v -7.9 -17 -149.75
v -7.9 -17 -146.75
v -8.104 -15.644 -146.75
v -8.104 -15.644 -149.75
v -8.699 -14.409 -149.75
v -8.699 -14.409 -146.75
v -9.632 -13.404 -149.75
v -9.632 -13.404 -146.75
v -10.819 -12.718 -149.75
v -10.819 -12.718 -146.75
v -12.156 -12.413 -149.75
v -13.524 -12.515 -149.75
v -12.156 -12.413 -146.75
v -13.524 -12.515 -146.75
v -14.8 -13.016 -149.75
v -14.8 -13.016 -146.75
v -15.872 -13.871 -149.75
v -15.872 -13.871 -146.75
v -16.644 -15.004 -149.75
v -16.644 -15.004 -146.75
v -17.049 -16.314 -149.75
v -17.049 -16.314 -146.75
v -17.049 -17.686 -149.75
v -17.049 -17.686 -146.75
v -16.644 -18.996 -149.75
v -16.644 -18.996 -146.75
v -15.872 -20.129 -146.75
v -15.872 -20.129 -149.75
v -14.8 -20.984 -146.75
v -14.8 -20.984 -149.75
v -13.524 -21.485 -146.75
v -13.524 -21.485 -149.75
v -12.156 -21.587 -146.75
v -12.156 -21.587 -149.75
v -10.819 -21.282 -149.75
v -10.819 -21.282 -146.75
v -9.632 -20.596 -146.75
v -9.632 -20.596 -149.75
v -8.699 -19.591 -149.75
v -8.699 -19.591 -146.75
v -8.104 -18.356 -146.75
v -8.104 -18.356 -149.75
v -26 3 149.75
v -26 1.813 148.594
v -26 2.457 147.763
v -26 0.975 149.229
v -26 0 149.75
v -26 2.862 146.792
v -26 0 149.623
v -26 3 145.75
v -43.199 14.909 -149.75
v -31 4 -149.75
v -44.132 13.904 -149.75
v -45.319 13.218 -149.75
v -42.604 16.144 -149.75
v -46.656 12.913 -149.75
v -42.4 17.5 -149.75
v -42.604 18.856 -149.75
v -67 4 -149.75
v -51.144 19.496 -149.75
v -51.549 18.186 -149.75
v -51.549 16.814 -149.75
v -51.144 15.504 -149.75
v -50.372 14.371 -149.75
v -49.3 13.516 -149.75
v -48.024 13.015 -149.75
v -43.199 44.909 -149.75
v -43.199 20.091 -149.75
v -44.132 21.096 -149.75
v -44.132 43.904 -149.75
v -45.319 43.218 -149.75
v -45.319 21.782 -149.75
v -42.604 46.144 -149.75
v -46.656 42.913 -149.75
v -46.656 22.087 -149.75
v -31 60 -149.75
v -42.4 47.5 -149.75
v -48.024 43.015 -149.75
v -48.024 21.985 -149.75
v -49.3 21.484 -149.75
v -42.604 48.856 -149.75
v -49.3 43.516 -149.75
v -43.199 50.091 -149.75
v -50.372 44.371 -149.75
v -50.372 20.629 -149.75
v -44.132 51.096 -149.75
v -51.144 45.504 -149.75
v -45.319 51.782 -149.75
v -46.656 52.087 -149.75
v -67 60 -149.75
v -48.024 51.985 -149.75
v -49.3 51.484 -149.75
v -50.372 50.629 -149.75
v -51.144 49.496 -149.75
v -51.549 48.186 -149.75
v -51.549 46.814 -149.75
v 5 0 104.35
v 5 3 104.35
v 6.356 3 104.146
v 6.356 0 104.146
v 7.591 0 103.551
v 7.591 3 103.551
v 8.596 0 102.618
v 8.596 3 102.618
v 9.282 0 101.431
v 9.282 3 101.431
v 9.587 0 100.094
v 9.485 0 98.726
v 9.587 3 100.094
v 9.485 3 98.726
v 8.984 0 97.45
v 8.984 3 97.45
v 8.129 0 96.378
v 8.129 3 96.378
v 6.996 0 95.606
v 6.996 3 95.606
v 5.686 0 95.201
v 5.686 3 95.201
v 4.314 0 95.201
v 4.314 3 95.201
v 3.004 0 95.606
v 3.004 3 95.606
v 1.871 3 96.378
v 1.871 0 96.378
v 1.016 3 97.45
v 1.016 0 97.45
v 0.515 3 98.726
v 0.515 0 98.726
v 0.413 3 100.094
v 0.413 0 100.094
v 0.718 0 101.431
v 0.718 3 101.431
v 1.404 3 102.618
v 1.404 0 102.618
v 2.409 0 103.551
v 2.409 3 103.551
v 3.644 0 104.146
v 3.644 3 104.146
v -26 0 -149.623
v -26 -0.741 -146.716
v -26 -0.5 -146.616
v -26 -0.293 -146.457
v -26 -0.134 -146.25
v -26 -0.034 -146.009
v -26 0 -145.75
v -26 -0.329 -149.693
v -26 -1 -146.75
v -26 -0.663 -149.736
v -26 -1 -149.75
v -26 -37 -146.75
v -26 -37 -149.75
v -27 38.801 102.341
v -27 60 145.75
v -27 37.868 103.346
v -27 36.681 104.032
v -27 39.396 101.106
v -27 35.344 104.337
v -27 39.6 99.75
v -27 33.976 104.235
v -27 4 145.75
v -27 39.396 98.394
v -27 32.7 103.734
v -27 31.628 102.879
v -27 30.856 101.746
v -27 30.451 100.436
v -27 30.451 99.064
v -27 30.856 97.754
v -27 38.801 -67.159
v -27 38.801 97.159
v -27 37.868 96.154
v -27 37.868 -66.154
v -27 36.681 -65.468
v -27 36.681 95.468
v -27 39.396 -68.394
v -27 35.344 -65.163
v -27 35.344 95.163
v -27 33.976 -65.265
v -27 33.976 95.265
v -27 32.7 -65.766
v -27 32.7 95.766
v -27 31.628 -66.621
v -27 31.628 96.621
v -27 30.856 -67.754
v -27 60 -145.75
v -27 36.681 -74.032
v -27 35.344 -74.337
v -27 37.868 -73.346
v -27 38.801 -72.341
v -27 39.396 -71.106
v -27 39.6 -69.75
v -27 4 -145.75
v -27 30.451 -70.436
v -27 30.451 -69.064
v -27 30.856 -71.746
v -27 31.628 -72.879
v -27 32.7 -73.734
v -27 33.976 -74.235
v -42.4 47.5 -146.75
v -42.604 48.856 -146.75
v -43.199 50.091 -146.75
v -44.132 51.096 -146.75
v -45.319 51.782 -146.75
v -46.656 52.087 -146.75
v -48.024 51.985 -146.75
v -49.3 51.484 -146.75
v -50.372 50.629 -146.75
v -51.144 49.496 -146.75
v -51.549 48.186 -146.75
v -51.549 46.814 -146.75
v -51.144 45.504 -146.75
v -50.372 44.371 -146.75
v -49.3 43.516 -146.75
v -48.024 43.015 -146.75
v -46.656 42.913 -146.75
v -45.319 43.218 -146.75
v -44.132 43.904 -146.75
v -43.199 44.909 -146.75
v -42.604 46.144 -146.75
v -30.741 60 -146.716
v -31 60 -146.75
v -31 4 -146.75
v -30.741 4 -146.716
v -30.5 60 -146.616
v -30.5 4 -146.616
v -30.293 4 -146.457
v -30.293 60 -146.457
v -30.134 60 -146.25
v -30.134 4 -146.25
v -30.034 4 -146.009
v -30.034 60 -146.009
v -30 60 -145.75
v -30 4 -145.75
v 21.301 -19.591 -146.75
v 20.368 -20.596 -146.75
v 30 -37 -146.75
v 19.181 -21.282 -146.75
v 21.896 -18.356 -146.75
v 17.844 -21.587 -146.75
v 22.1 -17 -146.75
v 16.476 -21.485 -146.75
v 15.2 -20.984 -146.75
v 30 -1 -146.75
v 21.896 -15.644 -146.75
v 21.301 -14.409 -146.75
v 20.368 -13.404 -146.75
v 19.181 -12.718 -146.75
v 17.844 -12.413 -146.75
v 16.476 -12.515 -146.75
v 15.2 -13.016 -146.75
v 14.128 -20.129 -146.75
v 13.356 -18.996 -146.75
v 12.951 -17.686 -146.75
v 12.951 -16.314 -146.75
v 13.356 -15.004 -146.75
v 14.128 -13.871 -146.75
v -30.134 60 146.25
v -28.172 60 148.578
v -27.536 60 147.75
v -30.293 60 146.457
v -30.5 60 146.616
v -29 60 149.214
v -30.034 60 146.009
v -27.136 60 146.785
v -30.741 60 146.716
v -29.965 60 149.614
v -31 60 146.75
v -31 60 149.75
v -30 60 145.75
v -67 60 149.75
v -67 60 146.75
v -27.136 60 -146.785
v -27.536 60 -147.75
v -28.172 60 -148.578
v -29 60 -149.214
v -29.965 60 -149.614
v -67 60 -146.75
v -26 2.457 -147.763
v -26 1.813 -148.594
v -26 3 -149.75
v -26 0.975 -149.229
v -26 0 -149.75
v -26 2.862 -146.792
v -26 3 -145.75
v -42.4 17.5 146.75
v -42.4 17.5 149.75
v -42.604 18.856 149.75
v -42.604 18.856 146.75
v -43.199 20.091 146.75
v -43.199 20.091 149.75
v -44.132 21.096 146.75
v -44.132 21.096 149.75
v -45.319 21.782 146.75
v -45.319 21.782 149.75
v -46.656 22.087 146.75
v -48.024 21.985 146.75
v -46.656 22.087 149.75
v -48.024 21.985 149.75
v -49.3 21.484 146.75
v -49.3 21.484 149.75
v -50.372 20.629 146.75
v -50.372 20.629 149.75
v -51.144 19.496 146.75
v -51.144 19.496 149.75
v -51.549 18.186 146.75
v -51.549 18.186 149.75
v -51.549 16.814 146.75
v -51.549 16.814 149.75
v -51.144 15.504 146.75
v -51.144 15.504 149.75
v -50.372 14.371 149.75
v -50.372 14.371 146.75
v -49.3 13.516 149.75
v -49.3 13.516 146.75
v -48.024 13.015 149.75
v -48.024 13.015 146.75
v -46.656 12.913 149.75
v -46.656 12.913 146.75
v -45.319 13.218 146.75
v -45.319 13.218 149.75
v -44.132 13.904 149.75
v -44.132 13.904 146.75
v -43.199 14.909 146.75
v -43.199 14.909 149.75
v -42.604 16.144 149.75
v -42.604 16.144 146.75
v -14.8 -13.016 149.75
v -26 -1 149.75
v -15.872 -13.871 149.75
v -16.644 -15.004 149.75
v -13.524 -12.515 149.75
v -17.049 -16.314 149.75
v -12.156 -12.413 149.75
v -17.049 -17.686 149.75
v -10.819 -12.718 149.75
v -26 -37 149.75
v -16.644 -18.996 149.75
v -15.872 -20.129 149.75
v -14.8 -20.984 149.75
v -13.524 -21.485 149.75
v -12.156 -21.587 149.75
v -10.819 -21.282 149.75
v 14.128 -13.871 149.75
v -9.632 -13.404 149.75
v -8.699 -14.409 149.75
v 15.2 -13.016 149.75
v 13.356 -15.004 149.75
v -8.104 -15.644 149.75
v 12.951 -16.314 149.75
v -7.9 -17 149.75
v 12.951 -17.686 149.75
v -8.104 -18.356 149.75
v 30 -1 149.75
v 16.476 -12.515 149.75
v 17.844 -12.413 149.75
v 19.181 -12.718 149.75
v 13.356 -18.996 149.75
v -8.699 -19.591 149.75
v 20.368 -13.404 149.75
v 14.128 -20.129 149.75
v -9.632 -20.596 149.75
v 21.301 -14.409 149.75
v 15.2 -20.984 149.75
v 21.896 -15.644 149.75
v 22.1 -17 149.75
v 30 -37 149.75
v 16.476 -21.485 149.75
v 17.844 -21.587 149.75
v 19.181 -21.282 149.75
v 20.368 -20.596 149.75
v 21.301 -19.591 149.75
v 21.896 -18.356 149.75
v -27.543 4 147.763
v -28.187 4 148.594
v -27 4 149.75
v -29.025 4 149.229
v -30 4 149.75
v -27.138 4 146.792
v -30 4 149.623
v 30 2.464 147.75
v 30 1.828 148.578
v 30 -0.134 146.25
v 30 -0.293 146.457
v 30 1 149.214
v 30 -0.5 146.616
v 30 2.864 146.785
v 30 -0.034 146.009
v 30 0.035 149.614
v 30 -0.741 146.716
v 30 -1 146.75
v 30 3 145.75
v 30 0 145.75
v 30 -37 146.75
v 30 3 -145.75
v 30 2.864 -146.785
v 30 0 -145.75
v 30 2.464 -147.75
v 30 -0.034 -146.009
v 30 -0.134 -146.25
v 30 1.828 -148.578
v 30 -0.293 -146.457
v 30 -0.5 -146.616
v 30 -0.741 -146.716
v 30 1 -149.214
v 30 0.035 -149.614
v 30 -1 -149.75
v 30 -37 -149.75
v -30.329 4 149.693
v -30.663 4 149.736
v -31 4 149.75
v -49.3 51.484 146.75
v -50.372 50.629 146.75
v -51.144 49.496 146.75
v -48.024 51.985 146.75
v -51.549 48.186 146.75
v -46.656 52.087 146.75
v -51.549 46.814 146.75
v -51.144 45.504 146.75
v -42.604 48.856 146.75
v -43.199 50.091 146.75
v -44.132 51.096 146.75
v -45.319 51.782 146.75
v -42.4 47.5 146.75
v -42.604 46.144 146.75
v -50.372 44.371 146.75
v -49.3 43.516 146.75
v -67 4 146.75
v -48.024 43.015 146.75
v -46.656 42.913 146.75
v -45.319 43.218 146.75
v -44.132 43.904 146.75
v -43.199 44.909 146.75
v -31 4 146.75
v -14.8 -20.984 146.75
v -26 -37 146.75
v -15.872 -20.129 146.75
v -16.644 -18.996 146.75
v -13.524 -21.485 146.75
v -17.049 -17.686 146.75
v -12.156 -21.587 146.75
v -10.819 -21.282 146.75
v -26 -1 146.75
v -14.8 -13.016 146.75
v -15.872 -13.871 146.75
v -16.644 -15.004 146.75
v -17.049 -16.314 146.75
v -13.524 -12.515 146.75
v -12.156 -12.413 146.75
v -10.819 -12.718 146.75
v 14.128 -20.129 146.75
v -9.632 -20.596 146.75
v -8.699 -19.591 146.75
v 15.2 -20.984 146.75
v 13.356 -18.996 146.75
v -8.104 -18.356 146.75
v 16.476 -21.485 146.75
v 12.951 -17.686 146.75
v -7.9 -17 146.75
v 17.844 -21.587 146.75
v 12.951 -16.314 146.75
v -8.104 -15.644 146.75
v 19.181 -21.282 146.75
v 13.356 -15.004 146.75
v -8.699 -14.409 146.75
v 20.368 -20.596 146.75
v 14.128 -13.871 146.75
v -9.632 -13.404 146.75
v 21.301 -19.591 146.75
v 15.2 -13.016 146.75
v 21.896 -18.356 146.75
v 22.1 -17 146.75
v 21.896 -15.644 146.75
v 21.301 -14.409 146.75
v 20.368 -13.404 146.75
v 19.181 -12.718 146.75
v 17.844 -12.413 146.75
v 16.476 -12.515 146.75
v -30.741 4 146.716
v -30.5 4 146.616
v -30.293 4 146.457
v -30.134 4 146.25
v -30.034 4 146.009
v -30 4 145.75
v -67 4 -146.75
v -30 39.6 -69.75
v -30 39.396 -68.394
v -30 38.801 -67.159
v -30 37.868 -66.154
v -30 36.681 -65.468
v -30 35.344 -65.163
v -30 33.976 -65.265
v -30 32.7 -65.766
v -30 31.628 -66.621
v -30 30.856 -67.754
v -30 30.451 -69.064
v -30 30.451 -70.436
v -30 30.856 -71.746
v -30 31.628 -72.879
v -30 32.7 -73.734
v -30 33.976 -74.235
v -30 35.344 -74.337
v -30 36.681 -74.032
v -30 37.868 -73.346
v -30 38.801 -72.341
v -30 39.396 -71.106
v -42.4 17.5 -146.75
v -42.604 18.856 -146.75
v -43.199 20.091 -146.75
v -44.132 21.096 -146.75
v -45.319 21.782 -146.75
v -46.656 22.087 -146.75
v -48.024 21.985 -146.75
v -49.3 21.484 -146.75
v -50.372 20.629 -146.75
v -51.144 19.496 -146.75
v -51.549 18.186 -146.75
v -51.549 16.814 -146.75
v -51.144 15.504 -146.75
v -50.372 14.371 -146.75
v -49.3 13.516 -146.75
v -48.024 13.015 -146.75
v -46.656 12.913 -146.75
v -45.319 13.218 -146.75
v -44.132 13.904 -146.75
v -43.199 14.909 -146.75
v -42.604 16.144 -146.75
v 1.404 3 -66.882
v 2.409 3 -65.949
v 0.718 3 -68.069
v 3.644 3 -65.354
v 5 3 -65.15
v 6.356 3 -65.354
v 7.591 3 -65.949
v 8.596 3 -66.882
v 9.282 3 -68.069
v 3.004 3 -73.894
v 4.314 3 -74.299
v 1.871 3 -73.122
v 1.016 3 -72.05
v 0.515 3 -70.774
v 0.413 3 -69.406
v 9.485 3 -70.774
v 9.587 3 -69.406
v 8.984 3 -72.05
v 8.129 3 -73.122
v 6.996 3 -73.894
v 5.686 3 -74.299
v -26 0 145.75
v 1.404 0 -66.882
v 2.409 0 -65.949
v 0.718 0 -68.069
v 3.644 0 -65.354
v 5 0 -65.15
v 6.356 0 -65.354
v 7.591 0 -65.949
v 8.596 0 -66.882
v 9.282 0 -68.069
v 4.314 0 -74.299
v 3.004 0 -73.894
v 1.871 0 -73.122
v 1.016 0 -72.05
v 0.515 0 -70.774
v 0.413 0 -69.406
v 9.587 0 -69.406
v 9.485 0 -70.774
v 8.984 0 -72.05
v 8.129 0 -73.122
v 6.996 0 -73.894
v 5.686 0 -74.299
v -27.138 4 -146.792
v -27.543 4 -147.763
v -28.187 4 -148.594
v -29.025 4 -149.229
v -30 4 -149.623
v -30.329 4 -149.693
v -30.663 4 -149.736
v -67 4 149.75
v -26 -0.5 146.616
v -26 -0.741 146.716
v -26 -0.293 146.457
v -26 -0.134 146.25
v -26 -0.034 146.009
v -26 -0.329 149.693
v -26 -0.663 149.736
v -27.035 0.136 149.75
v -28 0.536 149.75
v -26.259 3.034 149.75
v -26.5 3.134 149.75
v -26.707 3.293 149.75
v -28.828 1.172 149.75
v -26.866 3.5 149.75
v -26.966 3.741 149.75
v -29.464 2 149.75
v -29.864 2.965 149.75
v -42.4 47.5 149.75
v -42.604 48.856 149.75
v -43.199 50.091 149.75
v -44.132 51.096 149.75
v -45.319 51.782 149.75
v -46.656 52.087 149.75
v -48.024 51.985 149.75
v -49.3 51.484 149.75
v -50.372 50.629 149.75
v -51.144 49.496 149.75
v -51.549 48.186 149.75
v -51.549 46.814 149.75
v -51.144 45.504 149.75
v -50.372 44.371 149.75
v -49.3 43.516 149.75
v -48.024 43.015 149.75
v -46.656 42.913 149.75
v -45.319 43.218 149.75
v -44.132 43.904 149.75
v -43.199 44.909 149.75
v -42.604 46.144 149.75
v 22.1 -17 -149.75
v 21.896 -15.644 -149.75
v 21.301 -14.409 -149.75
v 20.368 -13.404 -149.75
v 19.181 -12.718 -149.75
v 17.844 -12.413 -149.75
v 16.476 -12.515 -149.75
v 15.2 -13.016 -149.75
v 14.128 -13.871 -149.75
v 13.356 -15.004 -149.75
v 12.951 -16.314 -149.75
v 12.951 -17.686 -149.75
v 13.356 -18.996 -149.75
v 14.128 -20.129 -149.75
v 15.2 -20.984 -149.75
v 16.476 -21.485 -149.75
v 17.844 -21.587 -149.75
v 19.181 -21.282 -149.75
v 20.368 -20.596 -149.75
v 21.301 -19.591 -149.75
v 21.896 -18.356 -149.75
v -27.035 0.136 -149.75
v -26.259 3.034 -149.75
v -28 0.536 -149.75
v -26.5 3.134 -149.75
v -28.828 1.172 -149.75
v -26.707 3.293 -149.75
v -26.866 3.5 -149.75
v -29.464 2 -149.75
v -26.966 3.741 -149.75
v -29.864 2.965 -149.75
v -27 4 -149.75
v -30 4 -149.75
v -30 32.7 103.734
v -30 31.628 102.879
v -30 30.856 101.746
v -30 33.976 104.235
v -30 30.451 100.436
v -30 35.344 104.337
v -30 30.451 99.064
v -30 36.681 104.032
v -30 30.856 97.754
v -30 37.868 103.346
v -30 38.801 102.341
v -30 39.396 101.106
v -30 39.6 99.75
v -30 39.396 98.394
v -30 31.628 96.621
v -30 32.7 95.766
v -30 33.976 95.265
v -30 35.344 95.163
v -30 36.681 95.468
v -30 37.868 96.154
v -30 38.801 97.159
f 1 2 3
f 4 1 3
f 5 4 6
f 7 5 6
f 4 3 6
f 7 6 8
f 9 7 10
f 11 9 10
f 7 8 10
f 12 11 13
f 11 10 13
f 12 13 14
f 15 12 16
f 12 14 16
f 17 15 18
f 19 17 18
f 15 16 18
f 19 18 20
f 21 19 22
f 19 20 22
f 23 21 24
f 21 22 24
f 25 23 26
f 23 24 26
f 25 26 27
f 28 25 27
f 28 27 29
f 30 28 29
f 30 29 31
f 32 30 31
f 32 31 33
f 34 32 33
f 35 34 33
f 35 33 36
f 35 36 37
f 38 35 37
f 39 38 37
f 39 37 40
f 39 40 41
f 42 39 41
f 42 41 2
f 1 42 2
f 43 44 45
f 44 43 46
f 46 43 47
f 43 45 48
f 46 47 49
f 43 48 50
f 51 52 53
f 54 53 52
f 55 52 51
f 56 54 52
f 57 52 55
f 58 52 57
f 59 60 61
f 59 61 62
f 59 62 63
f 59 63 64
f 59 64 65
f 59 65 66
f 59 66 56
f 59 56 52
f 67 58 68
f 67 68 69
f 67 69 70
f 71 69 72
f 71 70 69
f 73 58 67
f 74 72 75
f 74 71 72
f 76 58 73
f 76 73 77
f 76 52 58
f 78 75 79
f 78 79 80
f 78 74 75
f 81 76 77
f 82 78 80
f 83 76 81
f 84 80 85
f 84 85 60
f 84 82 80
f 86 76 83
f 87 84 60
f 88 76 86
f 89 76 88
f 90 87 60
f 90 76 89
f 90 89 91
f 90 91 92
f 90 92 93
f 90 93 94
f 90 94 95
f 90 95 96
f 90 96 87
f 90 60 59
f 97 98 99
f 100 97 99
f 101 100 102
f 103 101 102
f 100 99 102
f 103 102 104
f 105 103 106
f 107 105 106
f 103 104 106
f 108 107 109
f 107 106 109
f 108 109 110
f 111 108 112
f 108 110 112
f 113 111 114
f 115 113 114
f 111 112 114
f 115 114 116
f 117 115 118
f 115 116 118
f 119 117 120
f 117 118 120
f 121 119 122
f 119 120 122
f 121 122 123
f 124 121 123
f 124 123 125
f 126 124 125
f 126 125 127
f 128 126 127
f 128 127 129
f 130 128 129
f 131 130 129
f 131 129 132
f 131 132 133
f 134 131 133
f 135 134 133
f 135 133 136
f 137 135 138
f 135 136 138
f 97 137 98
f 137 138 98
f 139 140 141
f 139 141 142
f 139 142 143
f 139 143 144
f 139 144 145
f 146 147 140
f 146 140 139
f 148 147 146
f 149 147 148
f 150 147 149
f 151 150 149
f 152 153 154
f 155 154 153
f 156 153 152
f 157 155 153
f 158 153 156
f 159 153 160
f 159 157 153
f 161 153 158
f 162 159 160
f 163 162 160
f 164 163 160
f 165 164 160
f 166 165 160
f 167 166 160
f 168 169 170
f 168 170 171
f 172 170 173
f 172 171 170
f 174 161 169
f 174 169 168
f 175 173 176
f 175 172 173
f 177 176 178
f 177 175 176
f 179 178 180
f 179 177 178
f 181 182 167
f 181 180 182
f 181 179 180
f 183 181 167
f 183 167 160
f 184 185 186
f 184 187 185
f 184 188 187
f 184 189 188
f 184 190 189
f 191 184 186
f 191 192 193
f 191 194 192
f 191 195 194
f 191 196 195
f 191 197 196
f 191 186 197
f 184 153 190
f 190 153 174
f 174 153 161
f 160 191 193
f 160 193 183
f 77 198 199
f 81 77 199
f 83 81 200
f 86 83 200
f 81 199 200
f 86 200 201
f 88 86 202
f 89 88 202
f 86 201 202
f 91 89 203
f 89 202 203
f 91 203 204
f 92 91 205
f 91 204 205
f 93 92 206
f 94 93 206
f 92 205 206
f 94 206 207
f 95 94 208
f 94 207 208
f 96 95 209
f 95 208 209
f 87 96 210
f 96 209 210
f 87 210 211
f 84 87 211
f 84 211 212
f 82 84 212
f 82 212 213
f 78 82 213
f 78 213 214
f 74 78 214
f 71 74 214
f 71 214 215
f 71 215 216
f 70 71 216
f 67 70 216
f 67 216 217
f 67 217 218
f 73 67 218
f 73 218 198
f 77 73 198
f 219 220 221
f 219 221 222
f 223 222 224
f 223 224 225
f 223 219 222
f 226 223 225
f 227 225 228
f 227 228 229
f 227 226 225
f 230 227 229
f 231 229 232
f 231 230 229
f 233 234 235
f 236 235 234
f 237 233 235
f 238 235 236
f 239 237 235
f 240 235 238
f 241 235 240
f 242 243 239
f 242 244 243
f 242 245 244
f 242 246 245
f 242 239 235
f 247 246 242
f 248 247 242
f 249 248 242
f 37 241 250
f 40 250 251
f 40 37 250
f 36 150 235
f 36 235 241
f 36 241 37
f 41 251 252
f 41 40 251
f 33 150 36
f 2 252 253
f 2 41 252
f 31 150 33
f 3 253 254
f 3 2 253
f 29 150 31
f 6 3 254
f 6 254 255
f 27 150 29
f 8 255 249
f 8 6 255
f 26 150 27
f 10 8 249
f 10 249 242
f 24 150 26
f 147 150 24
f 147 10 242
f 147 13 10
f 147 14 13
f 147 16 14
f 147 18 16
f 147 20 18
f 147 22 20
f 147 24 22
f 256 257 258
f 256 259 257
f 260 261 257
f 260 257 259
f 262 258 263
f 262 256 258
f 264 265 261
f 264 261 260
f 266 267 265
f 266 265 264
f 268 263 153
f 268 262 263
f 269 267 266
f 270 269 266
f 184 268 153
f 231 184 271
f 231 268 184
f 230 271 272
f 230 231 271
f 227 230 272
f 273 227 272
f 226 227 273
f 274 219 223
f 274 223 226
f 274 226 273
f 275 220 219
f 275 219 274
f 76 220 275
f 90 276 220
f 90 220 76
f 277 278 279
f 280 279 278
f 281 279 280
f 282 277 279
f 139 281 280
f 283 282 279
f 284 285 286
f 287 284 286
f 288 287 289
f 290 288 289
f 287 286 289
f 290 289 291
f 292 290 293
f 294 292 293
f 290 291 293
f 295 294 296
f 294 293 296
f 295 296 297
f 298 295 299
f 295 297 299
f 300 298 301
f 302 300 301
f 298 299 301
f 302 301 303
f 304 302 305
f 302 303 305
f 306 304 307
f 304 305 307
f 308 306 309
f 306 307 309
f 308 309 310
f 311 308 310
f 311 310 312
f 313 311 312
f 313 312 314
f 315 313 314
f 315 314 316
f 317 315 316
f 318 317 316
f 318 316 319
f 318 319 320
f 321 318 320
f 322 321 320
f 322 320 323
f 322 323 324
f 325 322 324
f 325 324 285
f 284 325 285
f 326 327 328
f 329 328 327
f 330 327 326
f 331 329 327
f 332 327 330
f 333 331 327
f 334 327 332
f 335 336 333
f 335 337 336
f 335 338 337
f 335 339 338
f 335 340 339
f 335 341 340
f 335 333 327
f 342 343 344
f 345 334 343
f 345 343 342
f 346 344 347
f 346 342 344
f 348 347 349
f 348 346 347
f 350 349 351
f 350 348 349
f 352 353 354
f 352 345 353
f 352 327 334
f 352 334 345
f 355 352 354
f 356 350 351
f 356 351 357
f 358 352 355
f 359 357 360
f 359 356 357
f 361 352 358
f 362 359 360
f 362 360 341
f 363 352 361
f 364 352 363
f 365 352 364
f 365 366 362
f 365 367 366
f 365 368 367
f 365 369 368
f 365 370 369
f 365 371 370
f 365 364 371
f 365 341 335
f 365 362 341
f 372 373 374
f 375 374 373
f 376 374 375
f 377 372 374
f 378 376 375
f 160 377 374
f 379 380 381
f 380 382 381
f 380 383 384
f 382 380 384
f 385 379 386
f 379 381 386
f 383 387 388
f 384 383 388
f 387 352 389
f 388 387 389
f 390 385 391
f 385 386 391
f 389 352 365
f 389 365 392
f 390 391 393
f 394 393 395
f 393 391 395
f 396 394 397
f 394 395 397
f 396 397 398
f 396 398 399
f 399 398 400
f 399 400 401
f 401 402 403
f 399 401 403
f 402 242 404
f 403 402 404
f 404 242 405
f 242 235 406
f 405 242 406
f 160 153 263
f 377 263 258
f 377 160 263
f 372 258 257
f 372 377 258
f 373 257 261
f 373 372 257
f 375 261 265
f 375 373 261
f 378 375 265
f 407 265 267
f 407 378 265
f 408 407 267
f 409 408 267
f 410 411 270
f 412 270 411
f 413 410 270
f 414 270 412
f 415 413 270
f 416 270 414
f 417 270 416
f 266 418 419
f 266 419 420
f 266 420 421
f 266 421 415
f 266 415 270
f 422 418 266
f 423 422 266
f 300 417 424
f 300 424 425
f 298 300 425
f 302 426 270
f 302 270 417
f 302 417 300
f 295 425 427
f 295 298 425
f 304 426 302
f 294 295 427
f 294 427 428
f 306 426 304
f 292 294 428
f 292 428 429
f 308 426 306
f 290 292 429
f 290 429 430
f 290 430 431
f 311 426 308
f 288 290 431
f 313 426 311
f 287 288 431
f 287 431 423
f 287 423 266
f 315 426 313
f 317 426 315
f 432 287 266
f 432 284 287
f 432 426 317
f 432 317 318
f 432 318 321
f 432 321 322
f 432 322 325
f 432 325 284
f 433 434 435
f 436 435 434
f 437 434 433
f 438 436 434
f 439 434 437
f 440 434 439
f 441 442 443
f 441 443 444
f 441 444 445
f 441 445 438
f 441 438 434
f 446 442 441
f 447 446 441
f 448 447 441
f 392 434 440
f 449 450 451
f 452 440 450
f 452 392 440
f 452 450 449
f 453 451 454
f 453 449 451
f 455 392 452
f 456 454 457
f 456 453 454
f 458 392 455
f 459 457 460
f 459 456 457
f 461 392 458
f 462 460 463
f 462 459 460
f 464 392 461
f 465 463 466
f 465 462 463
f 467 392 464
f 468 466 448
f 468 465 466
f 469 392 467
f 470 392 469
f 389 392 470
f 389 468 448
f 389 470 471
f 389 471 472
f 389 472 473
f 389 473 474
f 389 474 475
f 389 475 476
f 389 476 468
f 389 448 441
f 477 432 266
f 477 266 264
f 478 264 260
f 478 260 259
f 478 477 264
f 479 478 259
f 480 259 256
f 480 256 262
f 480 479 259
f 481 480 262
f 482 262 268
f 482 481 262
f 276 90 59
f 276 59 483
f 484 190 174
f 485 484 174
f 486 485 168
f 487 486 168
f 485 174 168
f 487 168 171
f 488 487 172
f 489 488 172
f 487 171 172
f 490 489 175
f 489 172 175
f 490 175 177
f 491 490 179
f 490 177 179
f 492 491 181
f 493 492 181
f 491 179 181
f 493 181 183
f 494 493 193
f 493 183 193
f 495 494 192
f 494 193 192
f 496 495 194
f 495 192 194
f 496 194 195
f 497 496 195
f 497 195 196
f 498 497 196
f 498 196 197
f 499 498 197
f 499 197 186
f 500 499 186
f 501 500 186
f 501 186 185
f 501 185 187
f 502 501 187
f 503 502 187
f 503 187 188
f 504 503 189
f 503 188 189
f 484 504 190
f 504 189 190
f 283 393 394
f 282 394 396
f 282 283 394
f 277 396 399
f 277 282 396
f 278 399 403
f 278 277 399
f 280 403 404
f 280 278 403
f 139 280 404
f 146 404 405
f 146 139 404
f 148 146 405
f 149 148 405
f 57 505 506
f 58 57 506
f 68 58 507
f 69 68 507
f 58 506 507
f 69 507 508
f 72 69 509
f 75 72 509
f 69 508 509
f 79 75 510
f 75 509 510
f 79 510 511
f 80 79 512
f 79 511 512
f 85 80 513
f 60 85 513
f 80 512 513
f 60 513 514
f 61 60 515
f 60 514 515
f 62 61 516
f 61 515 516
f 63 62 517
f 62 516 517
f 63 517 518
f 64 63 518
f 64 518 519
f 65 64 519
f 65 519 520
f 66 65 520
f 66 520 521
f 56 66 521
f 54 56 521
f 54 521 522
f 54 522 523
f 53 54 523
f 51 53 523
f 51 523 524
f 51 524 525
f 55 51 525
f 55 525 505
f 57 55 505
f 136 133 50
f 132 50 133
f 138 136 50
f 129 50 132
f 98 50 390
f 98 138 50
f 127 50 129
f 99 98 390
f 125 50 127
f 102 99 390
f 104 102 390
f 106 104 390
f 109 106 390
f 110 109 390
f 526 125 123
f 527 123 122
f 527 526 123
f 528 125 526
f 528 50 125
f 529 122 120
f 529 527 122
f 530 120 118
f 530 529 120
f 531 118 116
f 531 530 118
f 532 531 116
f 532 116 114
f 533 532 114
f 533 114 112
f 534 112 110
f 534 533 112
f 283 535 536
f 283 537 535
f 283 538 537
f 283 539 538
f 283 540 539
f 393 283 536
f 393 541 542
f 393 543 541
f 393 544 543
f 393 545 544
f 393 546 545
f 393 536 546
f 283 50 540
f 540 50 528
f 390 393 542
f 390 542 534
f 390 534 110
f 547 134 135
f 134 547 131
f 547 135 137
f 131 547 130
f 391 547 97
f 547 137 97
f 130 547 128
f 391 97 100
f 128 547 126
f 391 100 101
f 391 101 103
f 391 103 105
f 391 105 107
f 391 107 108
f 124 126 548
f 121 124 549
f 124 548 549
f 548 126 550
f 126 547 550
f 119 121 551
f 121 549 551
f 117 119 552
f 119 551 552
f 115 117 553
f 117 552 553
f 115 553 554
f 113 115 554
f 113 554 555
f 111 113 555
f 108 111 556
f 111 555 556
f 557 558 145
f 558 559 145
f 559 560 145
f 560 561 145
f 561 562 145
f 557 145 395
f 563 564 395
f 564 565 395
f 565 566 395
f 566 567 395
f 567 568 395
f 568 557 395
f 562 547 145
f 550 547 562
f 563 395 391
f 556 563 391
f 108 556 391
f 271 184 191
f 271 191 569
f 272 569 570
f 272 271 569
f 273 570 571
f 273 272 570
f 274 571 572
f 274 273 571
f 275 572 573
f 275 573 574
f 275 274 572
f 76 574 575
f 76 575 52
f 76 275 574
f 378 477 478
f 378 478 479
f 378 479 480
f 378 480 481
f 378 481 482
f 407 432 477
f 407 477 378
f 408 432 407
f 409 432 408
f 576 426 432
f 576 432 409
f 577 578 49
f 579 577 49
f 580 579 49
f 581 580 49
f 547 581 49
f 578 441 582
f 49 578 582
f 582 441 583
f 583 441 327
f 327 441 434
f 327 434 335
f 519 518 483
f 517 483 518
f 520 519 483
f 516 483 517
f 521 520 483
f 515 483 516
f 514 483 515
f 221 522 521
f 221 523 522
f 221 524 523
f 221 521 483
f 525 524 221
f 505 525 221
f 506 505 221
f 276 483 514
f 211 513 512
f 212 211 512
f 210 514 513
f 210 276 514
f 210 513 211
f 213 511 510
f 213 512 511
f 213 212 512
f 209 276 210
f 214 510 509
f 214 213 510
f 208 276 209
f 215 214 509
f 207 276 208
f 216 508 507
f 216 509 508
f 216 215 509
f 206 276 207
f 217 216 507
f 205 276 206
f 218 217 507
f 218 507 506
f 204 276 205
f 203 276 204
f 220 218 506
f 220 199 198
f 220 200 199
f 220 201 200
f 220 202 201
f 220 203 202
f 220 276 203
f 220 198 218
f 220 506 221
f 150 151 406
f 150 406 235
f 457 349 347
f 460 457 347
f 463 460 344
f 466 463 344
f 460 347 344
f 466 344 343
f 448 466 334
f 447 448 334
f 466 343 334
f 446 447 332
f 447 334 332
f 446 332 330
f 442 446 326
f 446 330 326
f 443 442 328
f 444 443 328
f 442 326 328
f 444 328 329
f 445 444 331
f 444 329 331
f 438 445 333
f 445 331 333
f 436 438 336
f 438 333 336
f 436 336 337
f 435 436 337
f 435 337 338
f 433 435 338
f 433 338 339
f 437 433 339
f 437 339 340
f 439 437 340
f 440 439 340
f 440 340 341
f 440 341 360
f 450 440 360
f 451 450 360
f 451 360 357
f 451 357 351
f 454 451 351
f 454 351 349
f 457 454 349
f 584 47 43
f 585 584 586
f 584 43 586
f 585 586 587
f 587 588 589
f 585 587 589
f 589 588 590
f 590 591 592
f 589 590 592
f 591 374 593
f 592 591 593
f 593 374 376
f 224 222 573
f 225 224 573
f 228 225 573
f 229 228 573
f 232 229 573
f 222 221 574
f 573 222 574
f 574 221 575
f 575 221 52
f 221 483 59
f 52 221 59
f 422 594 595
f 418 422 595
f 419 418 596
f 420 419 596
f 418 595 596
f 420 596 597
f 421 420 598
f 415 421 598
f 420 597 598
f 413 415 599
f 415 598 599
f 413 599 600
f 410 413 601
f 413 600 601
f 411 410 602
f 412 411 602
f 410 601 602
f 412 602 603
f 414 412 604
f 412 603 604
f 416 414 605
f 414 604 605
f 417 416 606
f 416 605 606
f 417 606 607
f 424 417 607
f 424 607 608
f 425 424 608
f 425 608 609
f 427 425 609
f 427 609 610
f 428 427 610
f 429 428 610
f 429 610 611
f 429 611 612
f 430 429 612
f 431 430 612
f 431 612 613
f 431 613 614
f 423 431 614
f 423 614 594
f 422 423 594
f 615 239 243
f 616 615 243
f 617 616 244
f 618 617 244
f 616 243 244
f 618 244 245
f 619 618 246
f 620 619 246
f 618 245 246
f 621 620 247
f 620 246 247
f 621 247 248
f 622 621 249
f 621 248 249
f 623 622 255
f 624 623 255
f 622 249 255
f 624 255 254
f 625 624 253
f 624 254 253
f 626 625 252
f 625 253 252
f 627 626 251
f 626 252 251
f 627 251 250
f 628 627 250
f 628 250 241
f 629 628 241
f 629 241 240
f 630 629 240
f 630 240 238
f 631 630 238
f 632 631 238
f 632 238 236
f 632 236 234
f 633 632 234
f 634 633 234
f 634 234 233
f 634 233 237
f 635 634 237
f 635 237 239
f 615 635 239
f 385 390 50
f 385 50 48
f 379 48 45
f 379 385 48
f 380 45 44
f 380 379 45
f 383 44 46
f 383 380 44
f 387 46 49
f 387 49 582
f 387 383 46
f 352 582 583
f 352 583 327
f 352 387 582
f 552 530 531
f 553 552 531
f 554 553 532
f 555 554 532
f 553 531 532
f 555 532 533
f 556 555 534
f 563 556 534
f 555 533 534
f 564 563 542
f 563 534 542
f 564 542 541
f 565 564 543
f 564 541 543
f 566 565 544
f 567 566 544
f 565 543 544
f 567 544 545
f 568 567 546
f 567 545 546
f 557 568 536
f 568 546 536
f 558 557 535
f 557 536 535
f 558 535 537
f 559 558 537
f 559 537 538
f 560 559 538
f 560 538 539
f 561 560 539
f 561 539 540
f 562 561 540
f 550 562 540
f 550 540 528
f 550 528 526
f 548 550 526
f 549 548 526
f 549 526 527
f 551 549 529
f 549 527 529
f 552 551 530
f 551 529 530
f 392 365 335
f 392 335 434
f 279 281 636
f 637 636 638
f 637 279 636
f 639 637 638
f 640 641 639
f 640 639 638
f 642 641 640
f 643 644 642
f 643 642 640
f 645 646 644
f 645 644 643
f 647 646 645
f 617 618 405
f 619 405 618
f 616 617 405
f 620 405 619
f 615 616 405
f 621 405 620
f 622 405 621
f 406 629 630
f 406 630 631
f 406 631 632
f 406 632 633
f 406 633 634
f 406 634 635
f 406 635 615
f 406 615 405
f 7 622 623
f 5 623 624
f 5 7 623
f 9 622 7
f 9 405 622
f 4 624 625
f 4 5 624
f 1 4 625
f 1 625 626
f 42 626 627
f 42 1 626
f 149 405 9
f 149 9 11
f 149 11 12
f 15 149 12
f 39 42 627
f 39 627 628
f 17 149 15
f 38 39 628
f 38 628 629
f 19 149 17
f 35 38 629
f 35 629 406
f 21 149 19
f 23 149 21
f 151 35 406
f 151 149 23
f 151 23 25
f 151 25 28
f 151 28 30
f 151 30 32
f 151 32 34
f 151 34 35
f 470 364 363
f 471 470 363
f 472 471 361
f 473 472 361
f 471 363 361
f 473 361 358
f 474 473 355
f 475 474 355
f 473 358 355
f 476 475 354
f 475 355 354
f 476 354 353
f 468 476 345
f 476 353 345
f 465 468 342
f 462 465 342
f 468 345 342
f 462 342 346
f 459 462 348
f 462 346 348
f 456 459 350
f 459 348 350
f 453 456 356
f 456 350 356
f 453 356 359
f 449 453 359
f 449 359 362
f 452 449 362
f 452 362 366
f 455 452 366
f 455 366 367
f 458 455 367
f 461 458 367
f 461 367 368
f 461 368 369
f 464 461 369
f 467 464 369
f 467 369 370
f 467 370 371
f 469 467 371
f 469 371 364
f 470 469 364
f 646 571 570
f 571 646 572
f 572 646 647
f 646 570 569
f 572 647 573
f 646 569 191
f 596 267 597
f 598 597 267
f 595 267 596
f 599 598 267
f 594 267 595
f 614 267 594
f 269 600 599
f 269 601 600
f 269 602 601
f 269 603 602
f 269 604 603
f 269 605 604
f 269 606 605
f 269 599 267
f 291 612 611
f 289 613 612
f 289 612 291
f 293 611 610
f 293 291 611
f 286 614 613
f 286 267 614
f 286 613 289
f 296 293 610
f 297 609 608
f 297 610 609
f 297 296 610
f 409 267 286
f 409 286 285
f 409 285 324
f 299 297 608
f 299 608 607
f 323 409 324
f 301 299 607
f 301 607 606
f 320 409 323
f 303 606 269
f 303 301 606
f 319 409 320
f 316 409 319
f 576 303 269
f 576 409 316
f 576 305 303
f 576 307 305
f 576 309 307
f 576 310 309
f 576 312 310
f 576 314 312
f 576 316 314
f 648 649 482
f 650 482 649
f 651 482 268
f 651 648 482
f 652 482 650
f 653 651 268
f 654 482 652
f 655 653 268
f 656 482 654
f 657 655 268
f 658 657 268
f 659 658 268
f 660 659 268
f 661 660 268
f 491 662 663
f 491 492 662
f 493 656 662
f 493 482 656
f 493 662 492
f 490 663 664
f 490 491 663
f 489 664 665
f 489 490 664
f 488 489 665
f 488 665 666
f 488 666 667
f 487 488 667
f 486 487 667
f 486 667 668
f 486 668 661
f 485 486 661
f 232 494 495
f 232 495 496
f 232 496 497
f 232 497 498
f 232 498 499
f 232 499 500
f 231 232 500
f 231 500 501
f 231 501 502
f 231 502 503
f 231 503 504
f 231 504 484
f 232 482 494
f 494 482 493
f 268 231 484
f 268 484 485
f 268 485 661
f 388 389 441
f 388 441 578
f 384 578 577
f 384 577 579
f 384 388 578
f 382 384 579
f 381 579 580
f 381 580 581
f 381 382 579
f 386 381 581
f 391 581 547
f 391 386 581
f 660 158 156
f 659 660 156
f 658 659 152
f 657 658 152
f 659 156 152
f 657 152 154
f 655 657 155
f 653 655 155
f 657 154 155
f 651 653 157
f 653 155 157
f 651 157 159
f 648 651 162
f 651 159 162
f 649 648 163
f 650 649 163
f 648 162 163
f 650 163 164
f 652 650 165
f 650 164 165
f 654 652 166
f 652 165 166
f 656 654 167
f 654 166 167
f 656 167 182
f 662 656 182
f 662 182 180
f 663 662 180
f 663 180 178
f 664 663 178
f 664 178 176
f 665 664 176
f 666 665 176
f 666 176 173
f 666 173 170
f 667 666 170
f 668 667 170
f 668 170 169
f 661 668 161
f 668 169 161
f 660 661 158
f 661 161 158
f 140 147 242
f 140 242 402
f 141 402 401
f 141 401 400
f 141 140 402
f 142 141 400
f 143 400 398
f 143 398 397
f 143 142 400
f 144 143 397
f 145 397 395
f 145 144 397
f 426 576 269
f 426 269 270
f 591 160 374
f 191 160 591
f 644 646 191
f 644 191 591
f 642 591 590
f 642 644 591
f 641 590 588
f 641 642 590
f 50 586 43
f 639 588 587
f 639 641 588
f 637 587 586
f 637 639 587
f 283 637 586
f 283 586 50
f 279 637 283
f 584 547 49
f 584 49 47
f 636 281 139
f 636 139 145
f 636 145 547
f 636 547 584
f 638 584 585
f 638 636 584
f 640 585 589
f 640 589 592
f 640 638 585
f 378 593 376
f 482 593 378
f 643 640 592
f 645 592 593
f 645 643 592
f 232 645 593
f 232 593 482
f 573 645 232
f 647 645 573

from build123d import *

# Parameters (mm, degrees)
SKETCH1_W                      = 60
SKETCH1_H                      = 299.5
BASE_FLANGE1_DEPTH             = 3
EDGE_FLANGE1_STRIP_W           = 14
EDGE_FLANGE1_STRIP_H           = 3
EDGE_FLANGE1_STRIP_CUT_DEPTH   = 299.5
EDGE_FLANGE1_DEPTH             = 299.5
EDGE_FLANGE2_STRIP_W           = 14
EDGE_FLANGE2_STRIP_H           = 3
EDGE_FLANGE2_STRIP_CUT_DEPTH   = 56
EDGE_FLANGE2_STRIP_2_W         = 14
EDGE_FLANGE2_STRIP_2_H         = 3
EDGE_FLANGE2_STRIP_CUT_2_DEPTH = 56
EDGE_FLANGE2_STRIP_3_W         = 14
EDGE_FLANGE2_STRIP_3_H         = 3
EDGE_FLANGE2_STRIP_CUT_3_DEPTH = 56
EDGE_FLANGE2_STRIP_4_W         = 14
EDGE_FLANGE2_STRIP_4_H         = 3
EDGE_FLANGE2_STRIP_CUT_4_DEPTH = 56
EDGE_FLANGE2_DEPTH             = 56
EDGE_FLANGE2_BEND_DEPTH        = 56
EDGE_FLANGE2_BEND_2_DEPTH      = 56
EDGE_FLANGE2_BEND_3_DEPTH      = 56
SKETCH18_R                     = 4.6
EXTRUDE1_DEPTH                 = 313.712727595
SKETCH19_R                     = 4.6
EXTRUDE2_DEPTH                 = 3
SKETCH20_R                     = 4.6
EXTRUDE3_DEPTH                 = 3


# Sheet-metal steps are written as plain solids
with BuildPart() as part:
    # Sketch1 → Base-Flange1 (new body)
    with BuildSketch(Plane(origin=(0, 0, 0), x_dir=(1, 0, 0), z_dir=(0, 1, 0))):
        Rectangle(SKETCH1_W, SKETCH1_H)
    extrude(amount=BASE_FLANGE1_DEPTH)

    # Edge-Flange1 strip (across the edge) → Edge-Flange1 strip cut (cut)
    with BuildSketch(Plane(origin=(-30, 3, -149.75), x_dir=(1, 0, 0), z_dir=(0, 0, 1))):
        with Locations((-3, -1.5)):
            Rectangle(EDGE_FLANGE1_STRIP_W, EDGE_FLANGE1_STRIP_H)
    extrude(amount=EDGE_FLANGE1_STRIP_CUT_DEPTH, mode=Mode.SUBTRACT)

    # Edge-Flange1 section (across the edge) → Edge-Flange1 (add)
    with BuildSketch(Plane(origin=(-30, 3, -149.75), x_dir=(1, 0, 0), z_dir=(0, 0, 1))):
        with BuildLine():
            Line((0, 1), (0, 57))
            Line((0, 57), (3, 57))
            Line((3, 57), (3, 1))
            ThreePointArc((3, 1), (3.292893219, 0.292893219), (4, 0))
            Line((4, 0), (4, -3))
            ThreePointArc((4, -3), (1.171572875, -1.828427125), (0, 1))
        make_face()
    extrude(amount=EDGE_FLANGE1_DEPTH)

    # Edge-Flange2 strip (across the edge) → Edge-Flange2 strip cut (cut)
    with BuildSketch(Plane(origin=(-30, 4, 149.75), x_dir=(0, 0, -1), z_dir=(0, 1, 0))):
        with Locations((-3, -1.5)):
            Rectangle(EDGE_FLANGE2_STRIP_W, EDGE_FLANGE2_STRIP_H)
    extrude(amount=EDGE_FLANGE2_STRIP_CUT_DEPTH, mode=Mode.SUBTRACT)

    # Edge-Flange2 strip 2 (across the edge) → Edge-Flange2 strip cut 2 (cut)
    with BuildSketch(Plane(origin=(30, 0, 149.75), x_dir=(0, 0, -1), z_dir=(-1, 0, 0))):
        with Locations((-3, -1.5)):
            Rectangle(EDGE_FLANGE2_STRIP_2_W, EDGE_FLANGE2_STRIP_2_H)
    extrude(amount=EDGE_FLANGE2_STRIP_CUT_2_DEPTH, mode=Mode.SUBTRACT)

    # Edge-Flange2 strip 3 (across the edge) → Edge-Flange2 strip cut 3 (cut)
    with BuildSketch(Plane(origin=(-30, 60, -149.75), x_dir=(0, 0, 1), z_dir=(0, -1, 0))):
        with Locations((-3, -1.5)):
            Rectangle(EDGE_FLANGE2_STRIP_3_W, EDGE_FLANGE2_STRIP_3_H)
    extrude(amount=EDGE_FLANGE2_STRIP_CUT_3_DEPTH, mode=Mode.SUBTRACT)

    # Edge-Flange2 strip 4 (across the edge) → Edge-Flange2 strip cut 4 (cut)
    with BuildSketch(Plane(origin=(-26, 0, -149.75), x_dir=(0, 0, 1), z_dir=(1, 0, 0))):
        with Locations((-3, -1.5)):
            Rectangle(EDGE_FLANGE2_STRIP_4_W, EDGE_FLANGE2_STRIP_4_H)
    extrude(amount=EDGE_FLANGE2_STRIP_CUT_4_DEPTH, mode=Mode.SUBTRACT)

    # Edge-Flange2 section (across the edge) → Edge-Flange2 (add)
    with BuildSketch(Plane(origin=(-30, 4, 149.75), x_dir=(0, 0, -1), z_dir=(0, 1, 0))):
        with BuildLine():
            Line((0, 1), (0, 37))
            Line((0, 37), (3, 37))
            Line((3, 37), (3, 1))
            ThreePointArc((3, 1), (3.292893219, 0.292893219), (4, 0))
            Line((4, 0), (4, -3))
            ThreePointArc((4, -3), (1.171572875, -1.828427125), (0, 1))
        make_face()
    extrude(amount=EDGE_FLANGE2_DEPTH)

    # Edge-Flange2 section 2 (across the edge) → Edge-Flange2 bend (add)
    with BuildSketch(Plane(origin=(30, 0, 149.75), x_dir=(0, 0, -1), z_dir=(-1, 0, 0))):
        with BuildLine():
            Line((0, 1), (0, 37))
            Line((0, 37), (3, 37))
            Line((3, 37), (3, 1))
            ThreePointArc((3, 1), (3.292893219, 0.292893219), (4, 0))
            Line((4, 0), (4, -3))
            ThreePointArc((4, -3), (1.171572875, -1.828427125), (0, 1))
        make_face()
    extrude(amount=EDGE_FLANGE2_BEND_DEPTH)

    # Edge-Flange2 section 3 (across the edge) → Edge-Flange2 bend 2 (add)
    with BuildSketch(Plane(origin=(-30, 60, -149.75), x_dir=(0, 0, 1), z_dir=(0, -1, 0))):
        with BuildLine():
            Line((0, 1), (0, 37))
            Line((0, 37), (3, 37))
            Line((3, 37), (3, 1))
            ThreePointArc((3, 1), (3.292893219, 0.292893219), (4, 0))
            Line((4, 0), (4, -3))
            ThreePointArc((4, -3), (1.171572875, -1.828427125), (0, 1))
        make_face()
    extrude(amount=EDGE_FLANGE2_BEND_2_DEPTH)

    # Edge-Flange2 section 4 (across the edge) → Edge-Flange2 bend 3 (add)
    with BuildSketch(Plane(origin=(-26, 0, -149.75), x_dir=(0, 0, 1), z_dir=(1, 0, 0))):
        with BuildLine():
            Line((0, 1), (0, 37))
            Line((0, 37), (3, 37))
            Line((3, 37), (3, 1))
            ThreePointArc((3, 1), (3.292893219, 0.292893219), (4, 0))
            Line((4, 0), (4, -3))
            ThreePointArc((4, -3), (1.171572875, -1.828427125), (0, 1))
        make_face()
    extrude(amount=EDGE_FLANGE2_BEND_3_DEPTH)

    # Sketch18 → Extrude1 (cut, through all)
    with BuildSketch(Plane.XY.offset(149.75)):
        with Locations((-47, 47.5)):
            Circle(SKETCH18_R)
        with Locations((-47, 17.5)):
            Circle(SKETCH18_R)
        with Locations((-12.5, -17)):
            Circle(SKETCH18_R)
        with Locations((17.5, -17)):
            Circle(SKETCH18_R)
    extrude(amount=-EXTRUDE1_DEPTH, mode=Mode.SUBTRACT)

    # Sketch19 → Extrude2 (cut)
    with BuildSketch(Plane(origin=(-27, 0, 0), x_dir=(0, 0, -1), z_dir=(1, 0, 0))):
        with Locations(Location((-99.75, 35, 0), (0, 0, 90))):
            Circle(SKETCH19_R)
        with Locations(Location((69.75, 35, 0), (0, 0, 90))):
            Circle(SKETCH19_R)
    extrude(amount=-EXTRUDE2_DEPTH, mode=Mode.SUBTRACT)

    # Sketch20 → Extrude3 (cut)
    with BuildSketch(Plane(origin=(0, 3, 0), x_dir=(1, 0, 0), z_dir=(0, 1, 0))):
        with Locations(Location((5, 69.75, 0), (0, 0, 270))):
            Circle(SKETCH20_R)
        with Locations(Location((5, -99.75, 0), (0, 0, 270))):
            Circle(SKETCH20_R)
    extrude(amount=-EXTRUDE3_DEPTH, mode=Mode.SUBTRACT)


solid = part.part
